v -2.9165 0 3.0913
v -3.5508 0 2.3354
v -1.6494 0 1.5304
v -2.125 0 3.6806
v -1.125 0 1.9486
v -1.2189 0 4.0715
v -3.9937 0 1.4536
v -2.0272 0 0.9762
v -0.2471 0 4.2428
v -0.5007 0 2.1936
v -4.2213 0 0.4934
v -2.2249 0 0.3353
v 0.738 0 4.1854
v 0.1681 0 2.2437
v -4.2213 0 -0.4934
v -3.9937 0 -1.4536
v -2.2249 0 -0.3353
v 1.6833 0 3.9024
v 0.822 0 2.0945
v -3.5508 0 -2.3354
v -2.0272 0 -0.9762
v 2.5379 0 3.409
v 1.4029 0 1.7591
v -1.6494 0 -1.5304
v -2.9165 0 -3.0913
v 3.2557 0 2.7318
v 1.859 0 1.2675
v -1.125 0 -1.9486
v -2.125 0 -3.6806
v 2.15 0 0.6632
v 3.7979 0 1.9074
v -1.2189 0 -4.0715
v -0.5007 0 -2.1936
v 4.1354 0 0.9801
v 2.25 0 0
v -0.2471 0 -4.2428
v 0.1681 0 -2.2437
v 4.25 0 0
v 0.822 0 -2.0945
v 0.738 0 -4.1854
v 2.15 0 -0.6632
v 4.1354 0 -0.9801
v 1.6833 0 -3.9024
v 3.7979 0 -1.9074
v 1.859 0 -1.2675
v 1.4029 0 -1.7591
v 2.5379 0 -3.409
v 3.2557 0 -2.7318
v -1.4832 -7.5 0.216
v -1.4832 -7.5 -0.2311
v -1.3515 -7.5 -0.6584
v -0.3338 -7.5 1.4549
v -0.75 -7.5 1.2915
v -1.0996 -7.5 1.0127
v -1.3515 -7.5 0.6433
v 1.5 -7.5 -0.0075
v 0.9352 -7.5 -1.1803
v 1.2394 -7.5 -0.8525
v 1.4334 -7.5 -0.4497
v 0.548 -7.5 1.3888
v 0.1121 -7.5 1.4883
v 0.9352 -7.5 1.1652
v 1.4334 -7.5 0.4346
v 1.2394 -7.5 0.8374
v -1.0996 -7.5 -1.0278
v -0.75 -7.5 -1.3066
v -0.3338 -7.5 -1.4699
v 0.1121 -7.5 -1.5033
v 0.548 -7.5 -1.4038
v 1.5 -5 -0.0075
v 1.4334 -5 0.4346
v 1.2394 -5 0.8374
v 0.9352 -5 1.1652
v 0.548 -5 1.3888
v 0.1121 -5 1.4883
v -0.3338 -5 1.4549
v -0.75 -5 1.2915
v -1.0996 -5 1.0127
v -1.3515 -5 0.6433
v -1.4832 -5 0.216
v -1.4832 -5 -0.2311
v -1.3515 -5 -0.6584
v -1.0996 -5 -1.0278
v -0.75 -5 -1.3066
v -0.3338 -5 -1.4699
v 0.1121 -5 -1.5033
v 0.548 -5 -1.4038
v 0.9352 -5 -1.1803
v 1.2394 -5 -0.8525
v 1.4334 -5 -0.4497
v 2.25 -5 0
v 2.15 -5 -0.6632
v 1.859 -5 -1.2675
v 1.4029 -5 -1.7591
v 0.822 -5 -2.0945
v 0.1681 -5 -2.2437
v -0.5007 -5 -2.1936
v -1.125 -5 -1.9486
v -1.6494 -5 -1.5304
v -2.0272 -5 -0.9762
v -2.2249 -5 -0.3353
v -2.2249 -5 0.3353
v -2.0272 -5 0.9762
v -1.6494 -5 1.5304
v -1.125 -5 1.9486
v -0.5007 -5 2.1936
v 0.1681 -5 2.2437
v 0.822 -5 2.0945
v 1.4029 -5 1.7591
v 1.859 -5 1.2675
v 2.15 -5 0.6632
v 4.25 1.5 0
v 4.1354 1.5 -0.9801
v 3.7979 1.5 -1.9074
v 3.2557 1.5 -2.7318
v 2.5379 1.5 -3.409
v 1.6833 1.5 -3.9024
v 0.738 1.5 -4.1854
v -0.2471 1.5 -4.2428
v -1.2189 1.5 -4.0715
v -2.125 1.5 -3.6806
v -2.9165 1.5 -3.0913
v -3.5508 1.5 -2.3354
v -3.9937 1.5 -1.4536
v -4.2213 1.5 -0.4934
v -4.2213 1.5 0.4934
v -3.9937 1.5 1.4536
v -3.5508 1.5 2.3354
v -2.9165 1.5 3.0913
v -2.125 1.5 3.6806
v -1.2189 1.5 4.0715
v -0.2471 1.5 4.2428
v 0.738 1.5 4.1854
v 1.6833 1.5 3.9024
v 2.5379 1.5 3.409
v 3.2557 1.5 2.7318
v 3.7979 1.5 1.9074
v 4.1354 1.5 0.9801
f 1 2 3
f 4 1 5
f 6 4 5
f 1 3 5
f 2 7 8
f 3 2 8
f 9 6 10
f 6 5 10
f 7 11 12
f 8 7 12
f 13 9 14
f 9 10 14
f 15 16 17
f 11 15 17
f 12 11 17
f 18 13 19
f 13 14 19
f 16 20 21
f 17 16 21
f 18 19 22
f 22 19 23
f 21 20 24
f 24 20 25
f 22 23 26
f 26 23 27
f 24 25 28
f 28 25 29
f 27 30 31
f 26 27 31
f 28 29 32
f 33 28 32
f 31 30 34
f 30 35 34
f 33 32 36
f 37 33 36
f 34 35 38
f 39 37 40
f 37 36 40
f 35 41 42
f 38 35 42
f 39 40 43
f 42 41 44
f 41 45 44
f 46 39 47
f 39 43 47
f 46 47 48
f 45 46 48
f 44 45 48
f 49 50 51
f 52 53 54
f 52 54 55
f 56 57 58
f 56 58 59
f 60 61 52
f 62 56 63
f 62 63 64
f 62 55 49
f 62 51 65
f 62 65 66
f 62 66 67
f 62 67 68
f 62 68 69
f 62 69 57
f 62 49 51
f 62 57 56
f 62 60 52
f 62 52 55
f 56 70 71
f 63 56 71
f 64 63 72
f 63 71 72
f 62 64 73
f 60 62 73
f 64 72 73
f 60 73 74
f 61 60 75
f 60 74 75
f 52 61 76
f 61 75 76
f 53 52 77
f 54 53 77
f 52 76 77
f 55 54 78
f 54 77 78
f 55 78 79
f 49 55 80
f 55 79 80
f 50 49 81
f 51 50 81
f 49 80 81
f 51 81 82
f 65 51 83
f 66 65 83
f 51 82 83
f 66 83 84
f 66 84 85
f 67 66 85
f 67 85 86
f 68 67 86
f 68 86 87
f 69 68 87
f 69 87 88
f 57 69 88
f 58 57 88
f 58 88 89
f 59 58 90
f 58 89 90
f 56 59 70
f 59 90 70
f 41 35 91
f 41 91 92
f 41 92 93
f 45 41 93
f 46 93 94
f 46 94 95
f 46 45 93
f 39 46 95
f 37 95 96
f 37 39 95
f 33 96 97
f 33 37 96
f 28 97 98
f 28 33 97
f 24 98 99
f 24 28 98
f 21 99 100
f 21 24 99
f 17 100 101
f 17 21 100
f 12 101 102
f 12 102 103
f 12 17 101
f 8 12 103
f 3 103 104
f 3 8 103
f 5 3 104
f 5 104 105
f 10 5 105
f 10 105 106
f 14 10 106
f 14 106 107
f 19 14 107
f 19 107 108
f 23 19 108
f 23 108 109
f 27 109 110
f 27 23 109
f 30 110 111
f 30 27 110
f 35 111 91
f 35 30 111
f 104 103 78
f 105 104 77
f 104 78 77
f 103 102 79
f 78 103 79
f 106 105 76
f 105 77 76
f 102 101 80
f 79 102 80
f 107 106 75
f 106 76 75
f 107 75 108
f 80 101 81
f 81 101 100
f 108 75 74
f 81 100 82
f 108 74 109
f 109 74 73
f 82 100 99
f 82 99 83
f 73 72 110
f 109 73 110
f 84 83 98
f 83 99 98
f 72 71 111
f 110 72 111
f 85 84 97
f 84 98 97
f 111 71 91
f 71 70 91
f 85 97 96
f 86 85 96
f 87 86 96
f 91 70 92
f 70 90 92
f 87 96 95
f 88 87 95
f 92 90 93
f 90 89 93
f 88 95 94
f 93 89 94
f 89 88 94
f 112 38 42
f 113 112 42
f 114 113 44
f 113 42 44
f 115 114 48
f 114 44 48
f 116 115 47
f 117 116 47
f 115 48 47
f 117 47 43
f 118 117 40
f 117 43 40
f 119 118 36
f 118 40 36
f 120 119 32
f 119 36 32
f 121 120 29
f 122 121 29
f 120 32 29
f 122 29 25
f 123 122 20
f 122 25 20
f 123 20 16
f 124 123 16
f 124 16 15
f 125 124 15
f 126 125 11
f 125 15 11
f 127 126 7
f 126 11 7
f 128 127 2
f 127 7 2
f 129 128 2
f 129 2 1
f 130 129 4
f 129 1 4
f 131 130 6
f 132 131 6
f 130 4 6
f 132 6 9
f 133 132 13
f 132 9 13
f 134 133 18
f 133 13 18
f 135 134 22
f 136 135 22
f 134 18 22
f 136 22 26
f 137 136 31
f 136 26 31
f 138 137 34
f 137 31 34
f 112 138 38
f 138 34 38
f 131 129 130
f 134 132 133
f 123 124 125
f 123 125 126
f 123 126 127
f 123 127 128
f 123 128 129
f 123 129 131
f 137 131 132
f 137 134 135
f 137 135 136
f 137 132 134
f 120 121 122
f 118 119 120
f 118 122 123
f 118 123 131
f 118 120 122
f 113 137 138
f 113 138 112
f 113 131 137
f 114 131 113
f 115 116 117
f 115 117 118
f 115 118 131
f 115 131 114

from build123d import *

# Parameters (mm, degrees)
SKETCH1_R           = 4.25
BOSS_EXTRUDE1_DEPTH = 1.5
SKETCH1_3_R         = 2.25
BOSS_EXTRUDE2_DEPTH = 5
SKETCH2_R           = 1.5
BOSS_EXTRUDE3_DEPTH = 2.5


with BuildPart() as part:
    # Sketch1 → Boss-Extrude1 (new body)
    with BuildSketch(Plane(origin=(0, 0, 0), x_dir=(1, 0, 0), z_dir=(0, 1, 0))):
        Circle(SKETCH1_R)
    extrude(amount=BOSS_EXTRUDE1_DEPTH)

    # Sketch1<3> → Boss-Extrude2 (add)
    with BuildSketch(Plane(origin=(0, 0, 0), x_dir=(1, 0, 0), z_dir=(0, 1, 0))):
        Circle(SKETCH1_3_R)
    extrude(amount=-BOSS_EXTRUDE2_DEPTH)

    # Sketch2 → Boss-Extrude3 (add)
    with BuildSketch(Plane.XZ.offset(5)):
        with Locations((0, -0.007534146)):
            Circle(SKETCH2_R)
    extrude(amount=BOSS_EXTRUDE3_DEPTH)


solid = part.part
